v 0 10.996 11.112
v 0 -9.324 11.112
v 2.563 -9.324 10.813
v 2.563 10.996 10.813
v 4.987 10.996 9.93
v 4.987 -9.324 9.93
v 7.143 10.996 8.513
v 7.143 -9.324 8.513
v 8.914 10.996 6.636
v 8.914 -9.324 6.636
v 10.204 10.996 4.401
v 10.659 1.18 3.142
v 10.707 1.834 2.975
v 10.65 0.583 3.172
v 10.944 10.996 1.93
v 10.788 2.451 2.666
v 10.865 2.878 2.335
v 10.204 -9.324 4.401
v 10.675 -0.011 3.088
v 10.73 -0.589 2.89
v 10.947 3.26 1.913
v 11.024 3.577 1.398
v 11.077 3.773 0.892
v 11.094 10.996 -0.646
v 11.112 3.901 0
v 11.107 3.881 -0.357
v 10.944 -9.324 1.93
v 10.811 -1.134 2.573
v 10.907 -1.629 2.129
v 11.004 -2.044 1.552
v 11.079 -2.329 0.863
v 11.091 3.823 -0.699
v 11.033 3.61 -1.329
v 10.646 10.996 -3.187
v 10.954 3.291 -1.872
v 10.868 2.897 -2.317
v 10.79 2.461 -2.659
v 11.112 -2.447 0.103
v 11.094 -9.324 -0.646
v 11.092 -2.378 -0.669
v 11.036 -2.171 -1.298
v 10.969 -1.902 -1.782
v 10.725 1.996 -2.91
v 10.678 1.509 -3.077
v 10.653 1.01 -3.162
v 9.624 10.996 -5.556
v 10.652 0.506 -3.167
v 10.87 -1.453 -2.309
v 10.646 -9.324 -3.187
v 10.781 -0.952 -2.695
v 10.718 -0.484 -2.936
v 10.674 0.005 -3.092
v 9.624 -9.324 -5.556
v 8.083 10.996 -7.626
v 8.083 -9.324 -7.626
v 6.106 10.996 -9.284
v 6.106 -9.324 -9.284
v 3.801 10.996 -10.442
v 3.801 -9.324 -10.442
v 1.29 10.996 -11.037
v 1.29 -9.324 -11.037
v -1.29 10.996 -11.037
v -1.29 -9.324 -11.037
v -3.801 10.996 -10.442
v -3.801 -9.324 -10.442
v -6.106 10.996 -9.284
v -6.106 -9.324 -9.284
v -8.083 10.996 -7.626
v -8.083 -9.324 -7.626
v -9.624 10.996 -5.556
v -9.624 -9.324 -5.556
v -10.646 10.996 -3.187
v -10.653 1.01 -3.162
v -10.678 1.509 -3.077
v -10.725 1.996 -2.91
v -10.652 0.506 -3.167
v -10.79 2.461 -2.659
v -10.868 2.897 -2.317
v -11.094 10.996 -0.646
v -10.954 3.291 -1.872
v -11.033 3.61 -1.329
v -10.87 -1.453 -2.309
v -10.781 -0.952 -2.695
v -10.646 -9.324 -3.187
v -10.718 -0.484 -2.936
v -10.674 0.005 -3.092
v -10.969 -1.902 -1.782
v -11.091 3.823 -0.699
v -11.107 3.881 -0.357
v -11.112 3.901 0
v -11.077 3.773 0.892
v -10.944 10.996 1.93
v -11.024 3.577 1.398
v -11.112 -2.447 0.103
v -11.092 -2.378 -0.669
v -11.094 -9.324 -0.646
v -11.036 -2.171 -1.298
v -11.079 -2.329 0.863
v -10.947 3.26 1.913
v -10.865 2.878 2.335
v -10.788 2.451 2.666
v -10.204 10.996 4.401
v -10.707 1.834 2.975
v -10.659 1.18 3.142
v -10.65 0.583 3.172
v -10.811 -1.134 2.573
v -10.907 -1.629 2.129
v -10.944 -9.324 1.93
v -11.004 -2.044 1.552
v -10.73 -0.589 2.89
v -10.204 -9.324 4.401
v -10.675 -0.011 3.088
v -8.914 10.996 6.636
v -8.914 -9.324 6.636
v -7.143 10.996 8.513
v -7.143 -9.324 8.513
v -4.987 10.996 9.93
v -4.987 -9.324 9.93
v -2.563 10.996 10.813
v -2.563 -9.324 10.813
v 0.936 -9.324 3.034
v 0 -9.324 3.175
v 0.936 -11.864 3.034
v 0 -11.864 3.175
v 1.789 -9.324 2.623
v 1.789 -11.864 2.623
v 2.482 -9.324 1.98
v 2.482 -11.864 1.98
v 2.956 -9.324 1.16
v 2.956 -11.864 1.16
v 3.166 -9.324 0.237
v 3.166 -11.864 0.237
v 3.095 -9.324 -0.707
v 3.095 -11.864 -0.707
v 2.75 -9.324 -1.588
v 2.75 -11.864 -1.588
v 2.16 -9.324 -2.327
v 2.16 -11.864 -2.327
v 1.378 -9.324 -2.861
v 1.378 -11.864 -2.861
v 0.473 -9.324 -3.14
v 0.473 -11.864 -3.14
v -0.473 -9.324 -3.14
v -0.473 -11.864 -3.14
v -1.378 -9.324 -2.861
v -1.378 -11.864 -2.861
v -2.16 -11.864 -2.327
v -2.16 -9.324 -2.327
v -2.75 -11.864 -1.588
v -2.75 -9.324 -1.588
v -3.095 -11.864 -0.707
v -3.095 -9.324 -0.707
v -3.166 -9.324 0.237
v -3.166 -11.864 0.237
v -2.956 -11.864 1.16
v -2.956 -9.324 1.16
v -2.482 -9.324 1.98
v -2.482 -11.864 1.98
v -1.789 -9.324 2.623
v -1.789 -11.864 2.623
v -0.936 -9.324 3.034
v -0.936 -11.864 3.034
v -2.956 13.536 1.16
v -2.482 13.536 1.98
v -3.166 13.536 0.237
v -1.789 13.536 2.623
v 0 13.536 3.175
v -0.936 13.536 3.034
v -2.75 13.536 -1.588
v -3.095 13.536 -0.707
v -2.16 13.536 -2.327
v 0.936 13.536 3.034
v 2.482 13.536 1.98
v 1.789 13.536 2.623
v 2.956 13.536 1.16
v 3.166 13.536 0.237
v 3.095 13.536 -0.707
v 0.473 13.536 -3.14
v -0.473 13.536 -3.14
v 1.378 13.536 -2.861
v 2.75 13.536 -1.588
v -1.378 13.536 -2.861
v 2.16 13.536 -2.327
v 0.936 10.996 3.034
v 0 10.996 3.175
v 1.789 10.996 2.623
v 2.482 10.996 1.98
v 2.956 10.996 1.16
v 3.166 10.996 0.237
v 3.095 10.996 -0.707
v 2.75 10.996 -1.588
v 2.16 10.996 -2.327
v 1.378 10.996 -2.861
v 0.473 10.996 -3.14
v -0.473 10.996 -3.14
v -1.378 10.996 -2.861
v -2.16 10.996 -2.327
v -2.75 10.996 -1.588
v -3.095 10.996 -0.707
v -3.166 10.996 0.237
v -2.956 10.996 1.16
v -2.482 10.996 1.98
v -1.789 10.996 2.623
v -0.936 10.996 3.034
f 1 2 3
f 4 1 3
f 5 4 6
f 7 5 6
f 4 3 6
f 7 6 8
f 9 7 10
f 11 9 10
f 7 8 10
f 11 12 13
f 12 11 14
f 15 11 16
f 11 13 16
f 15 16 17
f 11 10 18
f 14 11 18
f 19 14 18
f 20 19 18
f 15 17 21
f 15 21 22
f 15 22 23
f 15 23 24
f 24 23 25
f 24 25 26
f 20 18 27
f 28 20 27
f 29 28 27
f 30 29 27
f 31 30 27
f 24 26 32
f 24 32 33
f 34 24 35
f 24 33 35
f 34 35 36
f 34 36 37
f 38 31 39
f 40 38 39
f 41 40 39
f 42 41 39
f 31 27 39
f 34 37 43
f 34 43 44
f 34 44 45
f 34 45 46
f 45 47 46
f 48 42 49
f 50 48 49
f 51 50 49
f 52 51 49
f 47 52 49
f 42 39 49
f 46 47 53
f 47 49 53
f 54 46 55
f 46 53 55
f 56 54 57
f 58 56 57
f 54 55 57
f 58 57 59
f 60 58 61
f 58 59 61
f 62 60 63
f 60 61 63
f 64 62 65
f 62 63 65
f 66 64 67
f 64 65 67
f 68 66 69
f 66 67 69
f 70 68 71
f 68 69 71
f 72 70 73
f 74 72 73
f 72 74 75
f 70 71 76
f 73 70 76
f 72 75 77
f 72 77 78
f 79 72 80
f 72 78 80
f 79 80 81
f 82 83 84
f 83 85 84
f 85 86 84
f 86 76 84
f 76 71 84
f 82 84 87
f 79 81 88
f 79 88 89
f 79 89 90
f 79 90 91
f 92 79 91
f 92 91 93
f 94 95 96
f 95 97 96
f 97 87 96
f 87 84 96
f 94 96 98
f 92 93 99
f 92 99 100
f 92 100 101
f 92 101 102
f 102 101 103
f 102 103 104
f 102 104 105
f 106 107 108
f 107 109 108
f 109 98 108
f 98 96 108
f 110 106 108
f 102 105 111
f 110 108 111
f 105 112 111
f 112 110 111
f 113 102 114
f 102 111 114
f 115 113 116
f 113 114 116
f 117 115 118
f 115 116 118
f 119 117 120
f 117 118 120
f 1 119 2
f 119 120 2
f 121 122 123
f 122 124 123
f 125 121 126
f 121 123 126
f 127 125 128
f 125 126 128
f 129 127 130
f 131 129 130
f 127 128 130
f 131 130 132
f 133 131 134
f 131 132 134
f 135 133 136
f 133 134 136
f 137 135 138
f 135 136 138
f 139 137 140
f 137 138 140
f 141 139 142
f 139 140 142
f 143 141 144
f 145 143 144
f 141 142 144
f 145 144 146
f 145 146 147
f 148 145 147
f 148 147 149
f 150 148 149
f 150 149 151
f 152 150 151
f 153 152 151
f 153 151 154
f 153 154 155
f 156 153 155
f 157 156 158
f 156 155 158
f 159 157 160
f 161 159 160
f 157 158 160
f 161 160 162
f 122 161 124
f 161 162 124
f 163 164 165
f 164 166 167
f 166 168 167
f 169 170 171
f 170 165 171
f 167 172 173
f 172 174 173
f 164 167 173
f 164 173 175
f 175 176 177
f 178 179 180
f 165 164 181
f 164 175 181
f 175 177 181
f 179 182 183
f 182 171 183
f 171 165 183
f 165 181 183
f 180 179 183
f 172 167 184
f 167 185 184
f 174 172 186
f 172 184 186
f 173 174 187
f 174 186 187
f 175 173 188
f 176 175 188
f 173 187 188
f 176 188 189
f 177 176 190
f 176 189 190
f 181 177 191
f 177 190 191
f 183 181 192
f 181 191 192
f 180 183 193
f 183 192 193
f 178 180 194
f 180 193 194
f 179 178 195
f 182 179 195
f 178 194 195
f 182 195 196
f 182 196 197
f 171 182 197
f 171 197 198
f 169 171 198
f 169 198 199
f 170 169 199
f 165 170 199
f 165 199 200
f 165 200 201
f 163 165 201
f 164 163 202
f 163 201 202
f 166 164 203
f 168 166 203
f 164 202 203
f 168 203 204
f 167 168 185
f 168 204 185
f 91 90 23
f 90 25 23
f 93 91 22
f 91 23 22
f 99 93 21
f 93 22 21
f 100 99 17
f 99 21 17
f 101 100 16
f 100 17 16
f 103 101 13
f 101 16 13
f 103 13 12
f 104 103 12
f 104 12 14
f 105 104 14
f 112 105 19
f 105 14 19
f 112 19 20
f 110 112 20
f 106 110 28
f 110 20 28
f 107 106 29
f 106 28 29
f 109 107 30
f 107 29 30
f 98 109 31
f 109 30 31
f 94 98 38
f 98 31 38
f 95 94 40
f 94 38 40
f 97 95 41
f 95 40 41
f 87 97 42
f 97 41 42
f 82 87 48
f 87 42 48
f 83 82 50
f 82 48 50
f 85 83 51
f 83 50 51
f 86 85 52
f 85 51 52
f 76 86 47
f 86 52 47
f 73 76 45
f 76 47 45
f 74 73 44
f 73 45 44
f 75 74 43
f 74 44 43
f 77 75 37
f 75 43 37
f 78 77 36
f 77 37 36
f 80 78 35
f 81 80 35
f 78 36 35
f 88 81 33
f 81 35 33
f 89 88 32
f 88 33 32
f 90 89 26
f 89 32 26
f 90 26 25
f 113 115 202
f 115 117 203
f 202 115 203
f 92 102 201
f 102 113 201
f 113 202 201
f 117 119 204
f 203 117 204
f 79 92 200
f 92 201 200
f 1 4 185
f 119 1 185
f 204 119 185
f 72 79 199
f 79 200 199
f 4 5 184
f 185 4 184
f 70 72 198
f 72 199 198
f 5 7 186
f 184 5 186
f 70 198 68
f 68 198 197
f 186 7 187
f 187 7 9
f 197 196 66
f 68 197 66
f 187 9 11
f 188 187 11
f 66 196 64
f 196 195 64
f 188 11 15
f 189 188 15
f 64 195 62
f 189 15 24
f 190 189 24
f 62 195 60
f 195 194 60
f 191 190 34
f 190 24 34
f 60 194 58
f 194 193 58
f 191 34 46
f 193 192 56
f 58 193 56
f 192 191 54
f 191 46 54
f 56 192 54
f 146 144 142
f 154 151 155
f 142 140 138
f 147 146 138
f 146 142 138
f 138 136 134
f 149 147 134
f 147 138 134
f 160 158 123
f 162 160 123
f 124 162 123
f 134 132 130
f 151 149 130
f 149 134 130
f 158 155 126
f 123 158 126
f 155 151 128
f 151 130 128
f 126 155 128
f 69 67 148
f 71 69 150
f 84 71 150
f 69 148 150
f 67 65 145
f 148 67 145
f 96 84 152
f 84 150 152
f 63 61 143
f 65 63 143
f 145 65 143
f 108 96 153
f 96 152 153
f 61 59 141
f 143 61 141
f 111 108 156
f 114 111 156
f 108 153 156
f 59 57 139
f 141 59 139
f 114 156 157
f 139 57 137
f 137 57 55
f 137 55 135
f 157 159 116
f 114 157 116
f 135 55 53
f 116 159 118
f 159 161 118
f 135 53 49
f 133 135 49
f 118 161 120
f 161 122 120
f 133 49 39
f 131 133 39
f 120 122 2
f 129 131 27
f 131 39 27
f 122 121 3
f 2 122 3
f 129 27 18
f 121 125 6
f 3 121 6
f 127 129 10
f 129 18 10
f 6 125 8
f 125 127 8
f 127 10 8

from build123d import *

# Parameters (mm, degrees)
F2_R     = 3.175
F3_DEPTH = 19.05


with BuildPart() as f1:
    # F0 (on Right) → F1 (revolve)
    with BuildSketch(Plane.YZ):
        Polygon((-11.863786, 3.175), (-11.863786, 0), (13.536214, 0), (13.536214, 3.175), (10.996214, 3.175), (10.996214, 11.1125), (-9.323786, 11.1125), (-9.323786, 3.175), align=None)
    revolve(axis=Axis((0, 2.995029, 0), (0, 1, 0)))

    # F2 (on Right) → F3 (cut, symmetric)
    with BuildSketch(Plane.YZ):
        with Locations((0.725993, 0)):
            Circle(F2_R)
    extrude(amount=F3_DEPTH, both=True, mode=Mode.SUBTRACT)


solid = f1.part
